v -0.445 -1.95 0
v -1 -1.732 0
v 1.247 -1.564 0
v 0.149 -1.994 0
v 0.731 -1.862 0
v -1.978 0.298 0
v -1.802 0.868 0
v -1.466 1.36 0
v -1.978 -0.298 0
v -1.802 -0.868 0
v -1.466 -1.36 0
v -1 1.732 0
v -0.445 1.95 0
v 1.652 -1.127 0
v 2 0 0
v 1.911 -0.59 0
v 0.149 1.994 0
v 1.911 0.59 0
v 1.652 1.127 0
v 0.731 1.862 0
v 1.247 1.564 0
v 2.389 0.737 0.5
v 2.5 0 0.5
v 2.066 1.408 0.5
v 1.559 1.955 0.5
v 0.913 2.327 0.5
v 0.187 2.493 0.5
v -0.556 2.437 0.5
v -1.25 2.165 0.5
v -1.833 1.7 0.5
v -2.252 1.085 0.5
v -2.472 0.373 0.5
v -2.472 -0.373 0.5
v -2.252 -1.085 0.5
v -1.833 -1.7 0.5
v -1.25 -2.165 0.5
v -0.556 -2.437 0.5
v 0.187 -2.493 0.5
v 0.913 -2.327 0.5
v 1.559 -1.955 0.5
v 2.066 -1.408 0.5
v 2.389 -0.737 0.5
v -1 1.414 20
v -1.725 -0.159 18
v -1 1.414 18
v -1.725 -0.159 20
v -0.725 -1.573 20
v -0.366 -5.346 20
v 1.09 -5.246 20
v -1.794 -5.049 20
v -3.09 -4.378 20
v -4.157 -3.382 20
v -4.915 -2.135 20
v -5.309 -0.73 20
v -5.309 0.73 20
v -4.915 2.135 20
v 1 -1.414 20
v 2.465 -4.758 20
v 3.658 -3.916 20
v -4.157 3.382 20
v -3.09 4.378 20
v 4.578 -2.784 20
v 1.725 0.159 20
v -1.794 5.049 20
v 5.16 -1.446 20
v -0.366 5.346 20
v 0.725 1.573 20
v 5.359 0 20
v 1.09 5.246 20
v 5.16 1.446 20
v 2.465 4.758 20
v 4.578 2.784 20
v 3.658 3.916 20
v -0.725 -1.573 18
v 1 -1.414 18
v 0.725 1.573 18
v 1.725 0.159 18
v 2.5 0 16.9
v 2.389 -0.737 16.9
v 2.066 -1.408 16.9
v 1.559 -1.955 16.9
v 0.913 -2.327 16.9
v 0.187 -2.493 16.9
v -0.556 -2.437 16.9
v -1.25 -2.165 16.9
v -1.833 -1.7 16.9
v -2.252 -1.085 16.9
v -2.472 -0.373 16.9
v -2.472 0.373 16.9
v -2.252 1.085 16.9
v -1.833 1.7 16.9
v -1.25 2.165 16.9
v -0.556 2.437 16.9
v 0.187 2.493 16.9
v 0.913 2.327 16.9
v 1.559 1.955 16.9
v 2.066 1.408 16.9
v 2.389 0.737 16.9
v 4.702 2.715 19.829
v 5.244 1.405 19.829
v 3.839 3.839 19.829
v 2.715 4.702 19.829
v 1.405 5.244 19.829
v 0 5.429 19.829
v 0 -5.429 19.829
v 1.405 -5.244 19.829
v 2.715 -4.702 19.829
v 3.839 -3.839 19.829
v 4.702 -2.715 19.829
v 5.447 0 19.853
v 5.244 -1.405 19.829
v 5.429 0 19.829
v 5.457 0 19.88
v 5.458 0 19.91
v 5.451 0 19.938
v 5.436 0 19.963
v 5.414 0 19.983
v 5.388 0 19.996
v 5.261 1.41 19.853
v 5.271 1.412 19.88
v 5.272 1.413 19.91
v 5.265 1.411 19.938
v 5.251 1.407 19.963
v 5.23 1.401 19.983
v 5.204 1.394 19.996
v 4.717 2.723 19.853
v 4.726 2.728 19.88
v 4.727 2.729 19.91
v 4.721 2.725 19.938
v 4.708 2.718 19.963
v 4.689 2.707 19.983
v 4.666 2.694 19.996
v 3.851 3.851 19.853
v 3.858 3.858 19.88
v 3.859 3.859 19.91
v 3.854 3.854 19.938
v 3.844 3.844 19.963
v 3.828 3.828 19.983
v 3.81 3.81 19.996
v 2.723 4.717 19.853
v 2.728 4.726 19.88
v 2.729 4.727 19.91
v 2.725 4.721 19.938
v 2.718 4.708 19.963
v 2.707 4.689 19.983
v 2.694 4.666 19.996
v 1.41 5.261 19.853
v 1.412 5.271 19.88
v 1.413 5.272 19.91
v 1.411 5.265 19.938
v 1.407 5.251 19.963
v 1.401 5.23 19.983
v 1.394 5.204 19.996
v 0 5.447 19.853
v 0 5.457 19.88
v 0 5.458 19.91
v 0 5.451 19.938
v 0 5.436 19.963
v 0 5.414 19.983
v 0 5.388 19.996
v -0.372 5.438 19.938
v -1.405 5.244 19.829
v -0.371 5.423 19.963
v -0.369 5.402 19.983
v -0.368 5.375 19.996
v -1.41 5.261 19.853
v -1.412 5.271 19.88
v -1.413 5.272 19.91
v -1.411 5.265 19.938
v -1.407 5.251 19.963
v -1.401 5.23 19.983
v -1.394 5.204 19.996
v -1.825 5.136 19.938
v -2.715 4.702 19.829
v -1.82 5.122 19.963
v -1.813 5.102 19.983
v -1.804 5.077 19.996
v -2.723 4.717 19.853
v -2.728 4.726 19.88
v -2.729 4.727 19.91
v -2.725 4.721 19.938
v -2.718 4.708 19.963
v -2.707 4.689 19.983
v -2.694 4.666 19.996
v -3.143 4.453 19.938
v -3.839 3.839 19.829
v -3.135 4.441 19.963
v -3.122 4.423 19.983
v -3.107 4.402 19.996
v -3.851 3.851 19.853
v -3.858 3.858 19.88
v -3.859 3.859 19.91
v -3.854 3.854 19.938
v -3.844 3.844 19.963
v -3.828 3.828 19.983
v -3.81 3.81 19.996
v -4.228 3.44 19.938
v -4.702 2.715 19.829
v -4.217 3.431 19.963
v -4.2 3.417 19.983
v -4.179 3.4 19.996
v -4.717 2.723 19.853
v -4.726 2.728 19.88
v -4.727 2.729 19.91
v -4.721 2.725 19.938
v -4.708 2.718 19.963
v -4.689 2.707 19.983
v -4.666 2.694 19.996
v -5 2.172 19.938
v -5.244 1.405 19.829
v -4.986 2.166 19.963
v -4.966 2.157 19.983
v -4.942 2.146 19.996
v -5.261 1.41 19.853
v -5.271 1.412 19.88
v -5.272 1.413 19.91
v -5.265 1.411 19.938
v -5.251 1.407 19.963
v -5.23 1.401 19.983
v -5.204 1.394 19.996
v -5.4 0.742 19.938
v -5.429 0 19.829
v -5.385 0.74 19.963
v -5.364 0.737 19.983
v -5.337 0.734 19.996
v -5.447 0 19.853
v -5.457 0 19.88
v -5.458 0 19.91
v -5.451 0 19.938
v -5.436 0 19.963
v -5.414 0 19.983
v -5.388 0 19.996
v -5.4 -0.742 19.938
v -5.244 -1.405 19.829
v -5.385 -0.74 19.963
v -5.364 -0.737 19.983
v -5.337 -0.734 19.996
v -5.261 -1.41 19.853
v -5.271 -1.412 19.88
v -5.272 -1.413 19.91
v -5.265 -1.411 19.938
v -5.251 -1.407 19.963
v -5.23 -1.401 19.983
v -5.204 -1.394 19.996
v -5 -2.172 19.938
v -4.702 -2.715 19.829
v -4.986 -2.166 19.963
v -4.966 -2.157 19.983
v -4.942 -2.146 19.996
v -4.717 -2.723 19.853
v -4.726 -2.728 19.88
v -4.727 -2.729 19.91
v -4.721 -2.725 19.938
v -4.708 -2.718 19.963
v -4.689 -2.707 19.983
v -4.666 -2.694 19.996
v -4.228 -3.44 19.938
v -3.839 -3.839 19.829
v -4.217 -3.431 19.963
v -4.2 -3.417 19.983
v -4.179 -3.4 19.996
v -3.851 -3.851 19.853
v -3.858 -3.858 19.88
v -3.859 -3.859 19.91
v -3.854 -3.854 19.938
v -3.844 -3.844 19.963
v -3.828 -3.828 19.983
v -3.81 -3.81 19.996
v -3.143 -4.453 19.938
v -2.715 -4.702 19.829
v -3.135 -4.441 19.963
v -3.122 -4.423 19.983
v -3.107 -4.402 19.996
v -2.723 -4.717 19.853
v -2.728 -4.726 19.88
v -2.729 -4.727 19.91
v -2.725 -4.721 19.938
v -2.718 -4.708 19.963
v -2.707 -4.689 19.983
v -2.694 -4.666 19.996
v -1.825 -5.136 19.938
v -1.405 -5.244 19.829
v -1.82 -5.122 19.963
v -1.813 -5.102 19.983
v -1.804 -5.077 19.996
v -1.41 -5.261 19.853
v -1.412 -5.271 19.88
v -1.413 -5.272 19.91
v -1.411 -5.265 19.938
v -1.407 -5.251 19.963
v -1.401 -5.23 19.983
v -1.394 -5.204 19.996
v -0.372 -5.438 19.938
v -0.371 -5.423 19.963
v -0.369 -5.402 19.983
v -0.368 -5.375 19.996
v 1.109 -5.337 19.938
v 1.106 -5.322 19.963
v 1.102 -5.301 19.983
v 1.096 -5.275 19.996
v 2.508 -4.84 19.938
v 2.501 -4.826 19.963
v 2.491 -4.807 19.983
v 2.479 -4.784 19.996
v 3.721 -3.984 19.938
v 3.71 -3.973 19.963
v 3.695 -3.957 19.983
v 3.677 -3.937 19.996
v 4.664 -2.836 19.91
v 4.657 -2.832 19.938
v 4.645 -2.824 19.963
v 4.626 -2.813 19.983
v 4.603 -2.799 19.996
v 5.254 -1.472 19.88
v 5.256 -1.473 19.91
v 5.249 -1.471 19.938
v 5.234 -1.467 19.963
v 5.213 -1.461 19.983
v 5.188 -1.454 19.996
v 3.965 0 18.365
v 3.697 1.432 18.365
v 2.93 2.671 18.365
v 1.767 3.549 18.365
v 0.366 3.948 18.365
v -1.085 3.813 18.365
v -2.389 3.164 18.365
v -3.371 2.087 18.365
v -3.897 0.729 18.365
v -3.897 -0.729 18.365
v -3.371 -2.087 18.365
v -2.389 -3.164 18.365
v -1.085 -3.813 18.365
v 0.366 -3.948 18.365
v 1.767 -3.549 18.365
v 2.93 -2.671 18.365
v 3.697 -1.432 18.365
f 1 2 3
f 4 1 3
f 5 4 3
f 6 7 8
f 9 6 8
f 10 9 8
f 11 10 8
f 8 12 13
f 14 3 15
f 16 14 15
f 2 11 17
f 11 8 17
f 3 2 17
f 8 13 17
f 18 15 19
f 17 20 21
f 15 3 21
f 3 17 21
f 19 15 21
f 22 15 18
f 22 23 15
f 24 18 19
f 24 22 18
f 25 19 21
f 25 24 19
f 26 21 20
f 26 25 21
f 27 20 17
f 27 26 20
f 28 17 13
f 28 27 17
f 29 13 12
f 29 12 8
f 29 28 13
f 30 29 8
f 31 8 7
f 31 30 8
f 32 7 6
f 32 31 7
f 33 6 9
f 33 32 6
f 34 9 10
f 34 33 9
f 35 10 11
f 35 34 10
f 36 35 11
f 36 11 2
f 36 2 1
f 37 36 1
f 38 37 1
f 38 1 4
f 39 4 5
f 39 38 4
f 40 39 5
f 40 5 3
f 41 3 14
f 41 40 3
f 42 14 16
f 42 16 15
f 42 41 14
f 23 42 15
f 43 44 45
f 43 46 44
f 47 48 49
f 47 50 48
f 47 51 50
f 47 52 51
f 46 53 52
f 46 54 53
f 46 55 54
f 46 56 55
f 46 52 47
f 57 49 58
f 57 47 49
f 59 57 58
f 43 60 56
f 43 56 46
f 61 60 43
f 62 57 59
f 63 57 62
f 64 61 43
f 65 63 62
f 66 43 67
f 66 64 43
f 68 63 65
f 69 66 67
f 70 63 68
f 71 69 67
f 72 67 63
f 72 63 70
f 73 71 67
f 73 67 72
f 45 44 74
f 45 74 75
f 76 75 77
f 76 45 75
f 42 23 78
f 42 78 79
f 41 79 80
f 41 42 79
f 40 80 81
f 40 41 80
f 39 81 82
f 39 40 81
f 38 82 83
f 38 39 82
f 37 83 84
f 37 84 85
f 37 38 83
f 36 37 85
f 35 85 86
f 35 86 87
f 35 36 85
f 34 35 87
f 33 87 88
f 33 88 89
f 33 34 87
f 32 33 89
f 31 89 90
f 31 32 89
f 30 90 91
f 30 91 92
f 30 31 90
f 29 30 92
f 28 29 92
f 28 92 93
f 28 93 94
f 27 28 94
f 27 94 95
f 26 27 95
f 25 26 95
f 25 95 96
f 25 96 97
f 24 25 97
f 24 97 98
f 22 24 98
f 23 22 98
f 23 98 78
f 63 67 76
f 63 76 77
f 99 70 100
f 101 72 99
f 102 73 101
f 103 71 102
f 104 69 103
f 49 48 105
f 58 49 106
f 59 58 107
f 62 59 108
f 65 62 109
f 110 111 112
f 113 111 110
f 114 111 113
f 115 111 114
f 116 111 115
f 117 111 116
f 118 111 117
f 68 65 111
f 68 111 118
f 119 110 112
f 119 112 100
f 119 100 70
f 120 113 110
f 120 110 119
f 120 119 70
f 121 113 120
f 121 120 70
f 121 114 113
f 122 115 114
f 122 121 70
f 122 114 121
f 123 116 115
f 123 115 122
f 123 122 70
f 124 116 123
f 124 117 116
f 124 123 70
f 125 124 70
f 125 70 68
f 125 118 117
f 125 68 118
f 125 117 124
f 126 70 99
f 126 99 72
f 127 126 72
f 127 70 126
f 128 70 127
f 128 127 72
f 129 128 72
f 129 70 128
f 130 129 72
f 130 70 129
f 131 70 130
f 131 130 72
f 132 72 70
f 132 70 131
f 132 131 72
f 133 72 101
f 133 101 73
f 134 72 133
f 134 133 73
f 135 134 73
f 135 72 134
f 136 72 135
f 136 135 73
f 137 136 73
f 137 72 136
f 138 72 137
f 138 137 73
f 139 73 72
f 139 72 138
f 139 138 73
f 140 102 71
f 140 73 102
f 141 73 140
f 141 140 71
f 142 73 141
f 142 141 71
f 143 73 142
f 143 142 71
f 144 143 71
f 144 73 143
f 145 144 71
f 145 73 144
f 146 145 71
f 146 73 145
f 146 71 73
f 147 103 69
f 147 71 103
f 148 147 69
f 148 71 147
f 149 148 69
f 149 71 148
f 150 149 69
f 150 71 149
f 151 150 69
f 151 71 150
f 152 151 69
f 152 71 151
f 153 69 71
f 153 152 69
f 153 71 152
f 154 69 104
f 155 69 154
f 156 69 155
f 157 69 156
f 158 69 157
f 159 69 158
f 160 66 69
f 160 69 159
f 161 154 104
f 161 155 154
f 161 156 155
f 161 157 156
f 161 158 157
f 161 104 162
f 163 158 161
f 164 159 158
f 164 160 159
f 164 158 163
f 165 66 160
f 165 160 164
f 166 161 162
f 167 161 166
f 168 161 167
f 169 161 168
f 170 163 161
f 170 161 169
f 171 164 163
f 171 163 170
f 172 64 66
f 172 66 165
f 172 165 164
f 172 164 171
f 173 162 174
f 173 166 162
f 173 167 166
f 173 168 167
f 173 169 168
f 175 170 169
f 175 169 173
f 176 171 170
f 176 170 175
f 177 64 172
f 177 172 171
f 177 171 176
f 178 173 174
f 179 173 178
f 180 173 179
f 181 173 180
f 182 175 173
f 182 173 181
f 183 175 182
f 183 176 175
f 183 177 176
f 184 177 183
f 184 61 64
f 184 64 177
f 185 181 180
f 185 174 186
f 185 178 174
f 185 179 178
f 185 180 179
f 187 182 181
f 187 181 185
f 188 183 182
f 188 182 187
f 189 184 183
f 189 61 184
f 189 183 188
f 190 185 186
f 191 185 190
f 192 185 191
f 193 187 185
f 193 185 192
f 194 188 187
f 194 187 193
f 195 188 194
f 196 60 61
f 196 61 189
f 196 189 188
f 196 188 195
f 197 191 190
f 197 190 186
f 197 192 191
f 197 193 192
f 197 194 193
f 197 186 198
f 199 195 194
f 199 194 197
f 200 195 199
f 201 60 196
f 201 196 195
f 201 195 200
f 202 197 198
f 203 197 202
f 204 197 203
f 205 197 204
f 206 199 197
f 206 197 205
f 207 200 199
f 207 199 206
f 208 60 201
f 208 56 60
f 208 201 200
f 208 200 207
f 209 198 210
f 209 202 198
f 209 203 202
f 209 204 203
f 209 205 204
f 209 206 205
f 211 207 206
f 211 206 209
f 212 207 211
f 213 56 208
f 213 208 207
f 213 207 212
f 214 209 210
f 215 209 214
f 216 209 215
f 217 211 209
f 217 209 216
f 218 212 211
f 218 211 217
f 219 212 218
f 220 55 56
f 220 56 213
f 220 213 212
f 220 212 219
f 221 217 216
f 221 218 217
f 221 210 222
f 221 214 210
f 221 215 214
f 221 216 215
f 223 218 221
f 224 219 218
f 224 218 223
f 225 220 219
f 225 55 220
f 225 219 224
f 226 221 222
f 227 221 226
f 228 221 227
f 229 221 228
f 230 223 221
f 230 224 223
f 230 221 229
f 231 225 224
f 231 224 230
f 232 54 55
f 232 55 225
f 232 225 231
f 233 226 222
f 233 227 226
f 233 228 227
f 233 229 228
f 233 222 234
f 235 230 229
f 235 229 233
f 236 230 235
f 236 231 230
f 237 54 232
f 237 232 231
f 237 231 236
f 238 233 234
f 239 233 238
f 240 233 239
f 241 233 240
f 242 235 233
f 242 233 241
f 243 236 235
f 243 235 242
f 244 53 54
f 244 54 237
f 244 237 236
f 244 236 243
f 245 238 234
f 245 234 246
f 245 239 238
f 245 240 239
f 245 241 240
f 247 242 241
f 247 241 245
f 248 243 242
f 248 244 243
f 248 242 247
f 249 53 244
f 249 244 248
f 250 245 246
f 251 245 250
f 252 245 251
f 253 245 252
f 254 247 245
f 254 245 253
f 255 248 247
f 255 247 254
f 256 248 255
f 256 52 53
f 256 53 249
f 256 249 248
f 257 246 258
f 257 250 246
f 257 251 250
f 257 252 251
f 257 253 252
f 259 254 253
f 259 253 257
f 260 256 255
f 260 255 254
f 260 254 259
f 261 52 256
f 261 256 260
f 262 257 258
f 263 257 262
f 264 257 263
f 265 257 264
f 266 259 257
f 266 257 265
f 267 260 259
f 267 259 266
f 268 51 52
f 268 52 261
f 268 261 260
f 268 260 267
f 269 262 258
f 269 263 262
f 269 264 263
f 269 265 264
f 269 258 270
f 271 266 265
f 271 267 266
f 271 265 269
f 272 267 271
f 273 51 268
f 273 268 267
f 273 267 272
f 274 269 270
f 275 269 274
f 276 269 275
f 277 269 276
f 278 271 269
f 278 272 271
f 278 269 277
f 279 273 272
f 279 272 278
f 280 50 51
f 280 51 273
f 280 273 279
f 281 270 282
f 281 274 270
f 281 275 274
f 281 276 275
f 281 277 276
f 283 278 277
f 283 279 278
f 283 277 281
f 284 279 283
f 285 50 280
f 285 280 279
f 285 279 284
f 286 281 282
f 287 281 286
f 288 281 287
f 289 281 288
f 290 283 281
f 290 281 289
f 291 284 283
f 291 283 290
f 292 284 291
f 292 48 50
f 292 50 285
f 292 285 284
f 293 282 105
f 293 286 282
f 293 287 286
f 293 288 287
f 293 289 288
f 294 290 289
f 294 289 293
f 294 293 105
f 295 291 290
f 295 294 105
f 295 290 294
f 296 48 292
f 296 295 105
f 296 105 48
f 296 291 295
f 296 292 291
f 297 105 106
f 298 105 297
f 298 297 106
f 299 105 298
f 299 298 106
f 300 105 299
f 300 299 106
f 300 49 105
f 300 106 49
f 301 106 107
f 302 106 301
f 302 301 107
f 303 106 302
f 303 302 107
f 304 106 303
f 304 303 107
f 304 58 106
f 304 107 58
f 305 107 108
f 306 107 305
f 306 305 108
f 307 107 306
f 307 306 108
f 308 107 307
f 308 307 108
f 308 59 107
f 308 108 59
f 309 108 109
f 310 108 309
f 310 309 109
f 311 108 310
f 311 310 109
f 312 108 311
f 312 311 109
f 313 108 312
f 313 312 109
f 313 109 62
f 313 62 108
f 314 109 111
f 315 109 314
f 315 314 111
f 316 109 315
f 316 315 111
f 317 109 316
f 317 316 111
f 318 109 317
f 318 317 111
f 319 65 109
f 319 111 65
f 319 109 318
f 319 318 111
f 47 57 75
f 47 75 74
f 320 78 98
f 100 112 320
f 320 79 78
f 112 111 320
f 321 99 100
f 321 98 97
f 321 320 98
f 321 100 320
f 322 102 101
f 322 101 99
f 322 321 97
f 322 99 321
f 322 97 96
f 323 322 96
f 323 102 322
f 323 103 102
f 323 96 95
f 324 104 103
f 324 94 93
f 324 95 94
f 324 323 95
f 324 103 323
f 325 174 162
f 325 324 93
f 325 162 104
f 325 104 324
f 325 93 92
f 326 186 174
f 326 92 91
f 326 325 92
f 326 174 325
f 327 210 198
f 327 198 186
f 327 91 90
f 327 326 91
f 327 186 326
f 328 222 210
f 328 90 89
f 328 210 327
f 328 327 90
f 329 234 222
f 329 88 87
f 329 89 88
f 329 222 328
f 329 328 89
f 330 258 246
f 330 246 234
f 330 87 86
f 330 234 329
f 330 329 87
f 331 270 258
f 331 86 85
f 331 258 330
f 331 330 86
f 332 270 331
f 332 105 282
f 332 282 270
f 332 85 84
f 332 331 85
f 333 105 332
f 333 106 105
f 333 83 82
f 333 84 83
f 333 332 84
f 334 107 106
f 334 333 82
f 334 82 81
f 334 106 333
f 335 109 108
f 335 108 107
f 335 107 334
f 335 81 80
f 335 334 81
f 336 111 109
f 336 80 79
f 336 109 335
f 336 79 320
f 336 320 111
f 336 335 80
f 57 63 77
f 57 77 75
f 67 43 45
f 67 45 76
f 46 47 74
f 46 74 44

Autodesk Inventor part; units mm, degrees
ref_plane "YZ Plane" through (0, 0, 0) normal (1, 0, 0) x (0, 1, 0)
ref_plane "XZ Plane" through (0, 0, 0) normal (0, 1, 0) x (-1, 0, 0)
ref_plane "XY Plane" through (0, 0, 0) normal (0, 0, 1) x (1, 0, 0)
sketch "Sketch1" plane through (0, 0, 0) normal (0, 0, 1) x (1, 0, 0)
  circle A0 centre (0, 0) radius 2.5
  dimension "Diameter" = 5
extrude "Extrusion1" add sketch "Sketch1" along normal blind 16.9
sketch "Sketch2" plane through (0, 0, 16.9) normal (0, 0, 1) x (1, 0, 0)
  circle A0 centre (0, 0) radius 2.5 projected
extrude "Extrusion2" add sketch "Sketch2" along normal blind 3.1 draft 45
sketch "Sketch3" plane through (0, 0, 20) normal (0, 0, 1) x (1, 0, 0)
  circle A0 centre (0, 0) radius 5.6 projected
  circle A1 centre (0, 0) radius 1.7321 construction
  line L0 (0.725, 1.573) -> (1.7248, 0.1586)
  line L1 (1.7248, 0.1586) -> (0.9997, -1.4144)
  line L2 (0.9997, -1.4144) -> (-0.725, -1.573)
  line L3 (-0.725, -1.573) -> (-1.7248, -0.1586)
  line L4 (-1.7248, -0.1586) -> (-0.9997, 1.4144)
  line L5 (-0.9997, 1.4144) -> (0.725, 1.573)
  dimension "Hex_Width" = 3
extrude "Extrusion3" cut sketch "Sketch3" against normal blind 2 contours L0 L1 L2 L3 L4 L5
thread "Thread1" size "M5x0.8" class "4g6g" standard "ANSI Metric M Profile" length 16.9
chamfer "Chamfer2" distance 0.5 angle 45 1 edges at (-2.5, 0, 0)
fillet "Fillet1" radius 0.1 1 edges at (-5.6, 0, 20)
equation "\"d10\" = Thread_Length"
equation "\"d13\" = Chamfer"
equation "\"Thread_Length\" = 16.9"
equation "\"Chamfer\" = 0.5"
properties part number "SCREW, FLAT HD, P, 5, M5X0_8X20MM"
